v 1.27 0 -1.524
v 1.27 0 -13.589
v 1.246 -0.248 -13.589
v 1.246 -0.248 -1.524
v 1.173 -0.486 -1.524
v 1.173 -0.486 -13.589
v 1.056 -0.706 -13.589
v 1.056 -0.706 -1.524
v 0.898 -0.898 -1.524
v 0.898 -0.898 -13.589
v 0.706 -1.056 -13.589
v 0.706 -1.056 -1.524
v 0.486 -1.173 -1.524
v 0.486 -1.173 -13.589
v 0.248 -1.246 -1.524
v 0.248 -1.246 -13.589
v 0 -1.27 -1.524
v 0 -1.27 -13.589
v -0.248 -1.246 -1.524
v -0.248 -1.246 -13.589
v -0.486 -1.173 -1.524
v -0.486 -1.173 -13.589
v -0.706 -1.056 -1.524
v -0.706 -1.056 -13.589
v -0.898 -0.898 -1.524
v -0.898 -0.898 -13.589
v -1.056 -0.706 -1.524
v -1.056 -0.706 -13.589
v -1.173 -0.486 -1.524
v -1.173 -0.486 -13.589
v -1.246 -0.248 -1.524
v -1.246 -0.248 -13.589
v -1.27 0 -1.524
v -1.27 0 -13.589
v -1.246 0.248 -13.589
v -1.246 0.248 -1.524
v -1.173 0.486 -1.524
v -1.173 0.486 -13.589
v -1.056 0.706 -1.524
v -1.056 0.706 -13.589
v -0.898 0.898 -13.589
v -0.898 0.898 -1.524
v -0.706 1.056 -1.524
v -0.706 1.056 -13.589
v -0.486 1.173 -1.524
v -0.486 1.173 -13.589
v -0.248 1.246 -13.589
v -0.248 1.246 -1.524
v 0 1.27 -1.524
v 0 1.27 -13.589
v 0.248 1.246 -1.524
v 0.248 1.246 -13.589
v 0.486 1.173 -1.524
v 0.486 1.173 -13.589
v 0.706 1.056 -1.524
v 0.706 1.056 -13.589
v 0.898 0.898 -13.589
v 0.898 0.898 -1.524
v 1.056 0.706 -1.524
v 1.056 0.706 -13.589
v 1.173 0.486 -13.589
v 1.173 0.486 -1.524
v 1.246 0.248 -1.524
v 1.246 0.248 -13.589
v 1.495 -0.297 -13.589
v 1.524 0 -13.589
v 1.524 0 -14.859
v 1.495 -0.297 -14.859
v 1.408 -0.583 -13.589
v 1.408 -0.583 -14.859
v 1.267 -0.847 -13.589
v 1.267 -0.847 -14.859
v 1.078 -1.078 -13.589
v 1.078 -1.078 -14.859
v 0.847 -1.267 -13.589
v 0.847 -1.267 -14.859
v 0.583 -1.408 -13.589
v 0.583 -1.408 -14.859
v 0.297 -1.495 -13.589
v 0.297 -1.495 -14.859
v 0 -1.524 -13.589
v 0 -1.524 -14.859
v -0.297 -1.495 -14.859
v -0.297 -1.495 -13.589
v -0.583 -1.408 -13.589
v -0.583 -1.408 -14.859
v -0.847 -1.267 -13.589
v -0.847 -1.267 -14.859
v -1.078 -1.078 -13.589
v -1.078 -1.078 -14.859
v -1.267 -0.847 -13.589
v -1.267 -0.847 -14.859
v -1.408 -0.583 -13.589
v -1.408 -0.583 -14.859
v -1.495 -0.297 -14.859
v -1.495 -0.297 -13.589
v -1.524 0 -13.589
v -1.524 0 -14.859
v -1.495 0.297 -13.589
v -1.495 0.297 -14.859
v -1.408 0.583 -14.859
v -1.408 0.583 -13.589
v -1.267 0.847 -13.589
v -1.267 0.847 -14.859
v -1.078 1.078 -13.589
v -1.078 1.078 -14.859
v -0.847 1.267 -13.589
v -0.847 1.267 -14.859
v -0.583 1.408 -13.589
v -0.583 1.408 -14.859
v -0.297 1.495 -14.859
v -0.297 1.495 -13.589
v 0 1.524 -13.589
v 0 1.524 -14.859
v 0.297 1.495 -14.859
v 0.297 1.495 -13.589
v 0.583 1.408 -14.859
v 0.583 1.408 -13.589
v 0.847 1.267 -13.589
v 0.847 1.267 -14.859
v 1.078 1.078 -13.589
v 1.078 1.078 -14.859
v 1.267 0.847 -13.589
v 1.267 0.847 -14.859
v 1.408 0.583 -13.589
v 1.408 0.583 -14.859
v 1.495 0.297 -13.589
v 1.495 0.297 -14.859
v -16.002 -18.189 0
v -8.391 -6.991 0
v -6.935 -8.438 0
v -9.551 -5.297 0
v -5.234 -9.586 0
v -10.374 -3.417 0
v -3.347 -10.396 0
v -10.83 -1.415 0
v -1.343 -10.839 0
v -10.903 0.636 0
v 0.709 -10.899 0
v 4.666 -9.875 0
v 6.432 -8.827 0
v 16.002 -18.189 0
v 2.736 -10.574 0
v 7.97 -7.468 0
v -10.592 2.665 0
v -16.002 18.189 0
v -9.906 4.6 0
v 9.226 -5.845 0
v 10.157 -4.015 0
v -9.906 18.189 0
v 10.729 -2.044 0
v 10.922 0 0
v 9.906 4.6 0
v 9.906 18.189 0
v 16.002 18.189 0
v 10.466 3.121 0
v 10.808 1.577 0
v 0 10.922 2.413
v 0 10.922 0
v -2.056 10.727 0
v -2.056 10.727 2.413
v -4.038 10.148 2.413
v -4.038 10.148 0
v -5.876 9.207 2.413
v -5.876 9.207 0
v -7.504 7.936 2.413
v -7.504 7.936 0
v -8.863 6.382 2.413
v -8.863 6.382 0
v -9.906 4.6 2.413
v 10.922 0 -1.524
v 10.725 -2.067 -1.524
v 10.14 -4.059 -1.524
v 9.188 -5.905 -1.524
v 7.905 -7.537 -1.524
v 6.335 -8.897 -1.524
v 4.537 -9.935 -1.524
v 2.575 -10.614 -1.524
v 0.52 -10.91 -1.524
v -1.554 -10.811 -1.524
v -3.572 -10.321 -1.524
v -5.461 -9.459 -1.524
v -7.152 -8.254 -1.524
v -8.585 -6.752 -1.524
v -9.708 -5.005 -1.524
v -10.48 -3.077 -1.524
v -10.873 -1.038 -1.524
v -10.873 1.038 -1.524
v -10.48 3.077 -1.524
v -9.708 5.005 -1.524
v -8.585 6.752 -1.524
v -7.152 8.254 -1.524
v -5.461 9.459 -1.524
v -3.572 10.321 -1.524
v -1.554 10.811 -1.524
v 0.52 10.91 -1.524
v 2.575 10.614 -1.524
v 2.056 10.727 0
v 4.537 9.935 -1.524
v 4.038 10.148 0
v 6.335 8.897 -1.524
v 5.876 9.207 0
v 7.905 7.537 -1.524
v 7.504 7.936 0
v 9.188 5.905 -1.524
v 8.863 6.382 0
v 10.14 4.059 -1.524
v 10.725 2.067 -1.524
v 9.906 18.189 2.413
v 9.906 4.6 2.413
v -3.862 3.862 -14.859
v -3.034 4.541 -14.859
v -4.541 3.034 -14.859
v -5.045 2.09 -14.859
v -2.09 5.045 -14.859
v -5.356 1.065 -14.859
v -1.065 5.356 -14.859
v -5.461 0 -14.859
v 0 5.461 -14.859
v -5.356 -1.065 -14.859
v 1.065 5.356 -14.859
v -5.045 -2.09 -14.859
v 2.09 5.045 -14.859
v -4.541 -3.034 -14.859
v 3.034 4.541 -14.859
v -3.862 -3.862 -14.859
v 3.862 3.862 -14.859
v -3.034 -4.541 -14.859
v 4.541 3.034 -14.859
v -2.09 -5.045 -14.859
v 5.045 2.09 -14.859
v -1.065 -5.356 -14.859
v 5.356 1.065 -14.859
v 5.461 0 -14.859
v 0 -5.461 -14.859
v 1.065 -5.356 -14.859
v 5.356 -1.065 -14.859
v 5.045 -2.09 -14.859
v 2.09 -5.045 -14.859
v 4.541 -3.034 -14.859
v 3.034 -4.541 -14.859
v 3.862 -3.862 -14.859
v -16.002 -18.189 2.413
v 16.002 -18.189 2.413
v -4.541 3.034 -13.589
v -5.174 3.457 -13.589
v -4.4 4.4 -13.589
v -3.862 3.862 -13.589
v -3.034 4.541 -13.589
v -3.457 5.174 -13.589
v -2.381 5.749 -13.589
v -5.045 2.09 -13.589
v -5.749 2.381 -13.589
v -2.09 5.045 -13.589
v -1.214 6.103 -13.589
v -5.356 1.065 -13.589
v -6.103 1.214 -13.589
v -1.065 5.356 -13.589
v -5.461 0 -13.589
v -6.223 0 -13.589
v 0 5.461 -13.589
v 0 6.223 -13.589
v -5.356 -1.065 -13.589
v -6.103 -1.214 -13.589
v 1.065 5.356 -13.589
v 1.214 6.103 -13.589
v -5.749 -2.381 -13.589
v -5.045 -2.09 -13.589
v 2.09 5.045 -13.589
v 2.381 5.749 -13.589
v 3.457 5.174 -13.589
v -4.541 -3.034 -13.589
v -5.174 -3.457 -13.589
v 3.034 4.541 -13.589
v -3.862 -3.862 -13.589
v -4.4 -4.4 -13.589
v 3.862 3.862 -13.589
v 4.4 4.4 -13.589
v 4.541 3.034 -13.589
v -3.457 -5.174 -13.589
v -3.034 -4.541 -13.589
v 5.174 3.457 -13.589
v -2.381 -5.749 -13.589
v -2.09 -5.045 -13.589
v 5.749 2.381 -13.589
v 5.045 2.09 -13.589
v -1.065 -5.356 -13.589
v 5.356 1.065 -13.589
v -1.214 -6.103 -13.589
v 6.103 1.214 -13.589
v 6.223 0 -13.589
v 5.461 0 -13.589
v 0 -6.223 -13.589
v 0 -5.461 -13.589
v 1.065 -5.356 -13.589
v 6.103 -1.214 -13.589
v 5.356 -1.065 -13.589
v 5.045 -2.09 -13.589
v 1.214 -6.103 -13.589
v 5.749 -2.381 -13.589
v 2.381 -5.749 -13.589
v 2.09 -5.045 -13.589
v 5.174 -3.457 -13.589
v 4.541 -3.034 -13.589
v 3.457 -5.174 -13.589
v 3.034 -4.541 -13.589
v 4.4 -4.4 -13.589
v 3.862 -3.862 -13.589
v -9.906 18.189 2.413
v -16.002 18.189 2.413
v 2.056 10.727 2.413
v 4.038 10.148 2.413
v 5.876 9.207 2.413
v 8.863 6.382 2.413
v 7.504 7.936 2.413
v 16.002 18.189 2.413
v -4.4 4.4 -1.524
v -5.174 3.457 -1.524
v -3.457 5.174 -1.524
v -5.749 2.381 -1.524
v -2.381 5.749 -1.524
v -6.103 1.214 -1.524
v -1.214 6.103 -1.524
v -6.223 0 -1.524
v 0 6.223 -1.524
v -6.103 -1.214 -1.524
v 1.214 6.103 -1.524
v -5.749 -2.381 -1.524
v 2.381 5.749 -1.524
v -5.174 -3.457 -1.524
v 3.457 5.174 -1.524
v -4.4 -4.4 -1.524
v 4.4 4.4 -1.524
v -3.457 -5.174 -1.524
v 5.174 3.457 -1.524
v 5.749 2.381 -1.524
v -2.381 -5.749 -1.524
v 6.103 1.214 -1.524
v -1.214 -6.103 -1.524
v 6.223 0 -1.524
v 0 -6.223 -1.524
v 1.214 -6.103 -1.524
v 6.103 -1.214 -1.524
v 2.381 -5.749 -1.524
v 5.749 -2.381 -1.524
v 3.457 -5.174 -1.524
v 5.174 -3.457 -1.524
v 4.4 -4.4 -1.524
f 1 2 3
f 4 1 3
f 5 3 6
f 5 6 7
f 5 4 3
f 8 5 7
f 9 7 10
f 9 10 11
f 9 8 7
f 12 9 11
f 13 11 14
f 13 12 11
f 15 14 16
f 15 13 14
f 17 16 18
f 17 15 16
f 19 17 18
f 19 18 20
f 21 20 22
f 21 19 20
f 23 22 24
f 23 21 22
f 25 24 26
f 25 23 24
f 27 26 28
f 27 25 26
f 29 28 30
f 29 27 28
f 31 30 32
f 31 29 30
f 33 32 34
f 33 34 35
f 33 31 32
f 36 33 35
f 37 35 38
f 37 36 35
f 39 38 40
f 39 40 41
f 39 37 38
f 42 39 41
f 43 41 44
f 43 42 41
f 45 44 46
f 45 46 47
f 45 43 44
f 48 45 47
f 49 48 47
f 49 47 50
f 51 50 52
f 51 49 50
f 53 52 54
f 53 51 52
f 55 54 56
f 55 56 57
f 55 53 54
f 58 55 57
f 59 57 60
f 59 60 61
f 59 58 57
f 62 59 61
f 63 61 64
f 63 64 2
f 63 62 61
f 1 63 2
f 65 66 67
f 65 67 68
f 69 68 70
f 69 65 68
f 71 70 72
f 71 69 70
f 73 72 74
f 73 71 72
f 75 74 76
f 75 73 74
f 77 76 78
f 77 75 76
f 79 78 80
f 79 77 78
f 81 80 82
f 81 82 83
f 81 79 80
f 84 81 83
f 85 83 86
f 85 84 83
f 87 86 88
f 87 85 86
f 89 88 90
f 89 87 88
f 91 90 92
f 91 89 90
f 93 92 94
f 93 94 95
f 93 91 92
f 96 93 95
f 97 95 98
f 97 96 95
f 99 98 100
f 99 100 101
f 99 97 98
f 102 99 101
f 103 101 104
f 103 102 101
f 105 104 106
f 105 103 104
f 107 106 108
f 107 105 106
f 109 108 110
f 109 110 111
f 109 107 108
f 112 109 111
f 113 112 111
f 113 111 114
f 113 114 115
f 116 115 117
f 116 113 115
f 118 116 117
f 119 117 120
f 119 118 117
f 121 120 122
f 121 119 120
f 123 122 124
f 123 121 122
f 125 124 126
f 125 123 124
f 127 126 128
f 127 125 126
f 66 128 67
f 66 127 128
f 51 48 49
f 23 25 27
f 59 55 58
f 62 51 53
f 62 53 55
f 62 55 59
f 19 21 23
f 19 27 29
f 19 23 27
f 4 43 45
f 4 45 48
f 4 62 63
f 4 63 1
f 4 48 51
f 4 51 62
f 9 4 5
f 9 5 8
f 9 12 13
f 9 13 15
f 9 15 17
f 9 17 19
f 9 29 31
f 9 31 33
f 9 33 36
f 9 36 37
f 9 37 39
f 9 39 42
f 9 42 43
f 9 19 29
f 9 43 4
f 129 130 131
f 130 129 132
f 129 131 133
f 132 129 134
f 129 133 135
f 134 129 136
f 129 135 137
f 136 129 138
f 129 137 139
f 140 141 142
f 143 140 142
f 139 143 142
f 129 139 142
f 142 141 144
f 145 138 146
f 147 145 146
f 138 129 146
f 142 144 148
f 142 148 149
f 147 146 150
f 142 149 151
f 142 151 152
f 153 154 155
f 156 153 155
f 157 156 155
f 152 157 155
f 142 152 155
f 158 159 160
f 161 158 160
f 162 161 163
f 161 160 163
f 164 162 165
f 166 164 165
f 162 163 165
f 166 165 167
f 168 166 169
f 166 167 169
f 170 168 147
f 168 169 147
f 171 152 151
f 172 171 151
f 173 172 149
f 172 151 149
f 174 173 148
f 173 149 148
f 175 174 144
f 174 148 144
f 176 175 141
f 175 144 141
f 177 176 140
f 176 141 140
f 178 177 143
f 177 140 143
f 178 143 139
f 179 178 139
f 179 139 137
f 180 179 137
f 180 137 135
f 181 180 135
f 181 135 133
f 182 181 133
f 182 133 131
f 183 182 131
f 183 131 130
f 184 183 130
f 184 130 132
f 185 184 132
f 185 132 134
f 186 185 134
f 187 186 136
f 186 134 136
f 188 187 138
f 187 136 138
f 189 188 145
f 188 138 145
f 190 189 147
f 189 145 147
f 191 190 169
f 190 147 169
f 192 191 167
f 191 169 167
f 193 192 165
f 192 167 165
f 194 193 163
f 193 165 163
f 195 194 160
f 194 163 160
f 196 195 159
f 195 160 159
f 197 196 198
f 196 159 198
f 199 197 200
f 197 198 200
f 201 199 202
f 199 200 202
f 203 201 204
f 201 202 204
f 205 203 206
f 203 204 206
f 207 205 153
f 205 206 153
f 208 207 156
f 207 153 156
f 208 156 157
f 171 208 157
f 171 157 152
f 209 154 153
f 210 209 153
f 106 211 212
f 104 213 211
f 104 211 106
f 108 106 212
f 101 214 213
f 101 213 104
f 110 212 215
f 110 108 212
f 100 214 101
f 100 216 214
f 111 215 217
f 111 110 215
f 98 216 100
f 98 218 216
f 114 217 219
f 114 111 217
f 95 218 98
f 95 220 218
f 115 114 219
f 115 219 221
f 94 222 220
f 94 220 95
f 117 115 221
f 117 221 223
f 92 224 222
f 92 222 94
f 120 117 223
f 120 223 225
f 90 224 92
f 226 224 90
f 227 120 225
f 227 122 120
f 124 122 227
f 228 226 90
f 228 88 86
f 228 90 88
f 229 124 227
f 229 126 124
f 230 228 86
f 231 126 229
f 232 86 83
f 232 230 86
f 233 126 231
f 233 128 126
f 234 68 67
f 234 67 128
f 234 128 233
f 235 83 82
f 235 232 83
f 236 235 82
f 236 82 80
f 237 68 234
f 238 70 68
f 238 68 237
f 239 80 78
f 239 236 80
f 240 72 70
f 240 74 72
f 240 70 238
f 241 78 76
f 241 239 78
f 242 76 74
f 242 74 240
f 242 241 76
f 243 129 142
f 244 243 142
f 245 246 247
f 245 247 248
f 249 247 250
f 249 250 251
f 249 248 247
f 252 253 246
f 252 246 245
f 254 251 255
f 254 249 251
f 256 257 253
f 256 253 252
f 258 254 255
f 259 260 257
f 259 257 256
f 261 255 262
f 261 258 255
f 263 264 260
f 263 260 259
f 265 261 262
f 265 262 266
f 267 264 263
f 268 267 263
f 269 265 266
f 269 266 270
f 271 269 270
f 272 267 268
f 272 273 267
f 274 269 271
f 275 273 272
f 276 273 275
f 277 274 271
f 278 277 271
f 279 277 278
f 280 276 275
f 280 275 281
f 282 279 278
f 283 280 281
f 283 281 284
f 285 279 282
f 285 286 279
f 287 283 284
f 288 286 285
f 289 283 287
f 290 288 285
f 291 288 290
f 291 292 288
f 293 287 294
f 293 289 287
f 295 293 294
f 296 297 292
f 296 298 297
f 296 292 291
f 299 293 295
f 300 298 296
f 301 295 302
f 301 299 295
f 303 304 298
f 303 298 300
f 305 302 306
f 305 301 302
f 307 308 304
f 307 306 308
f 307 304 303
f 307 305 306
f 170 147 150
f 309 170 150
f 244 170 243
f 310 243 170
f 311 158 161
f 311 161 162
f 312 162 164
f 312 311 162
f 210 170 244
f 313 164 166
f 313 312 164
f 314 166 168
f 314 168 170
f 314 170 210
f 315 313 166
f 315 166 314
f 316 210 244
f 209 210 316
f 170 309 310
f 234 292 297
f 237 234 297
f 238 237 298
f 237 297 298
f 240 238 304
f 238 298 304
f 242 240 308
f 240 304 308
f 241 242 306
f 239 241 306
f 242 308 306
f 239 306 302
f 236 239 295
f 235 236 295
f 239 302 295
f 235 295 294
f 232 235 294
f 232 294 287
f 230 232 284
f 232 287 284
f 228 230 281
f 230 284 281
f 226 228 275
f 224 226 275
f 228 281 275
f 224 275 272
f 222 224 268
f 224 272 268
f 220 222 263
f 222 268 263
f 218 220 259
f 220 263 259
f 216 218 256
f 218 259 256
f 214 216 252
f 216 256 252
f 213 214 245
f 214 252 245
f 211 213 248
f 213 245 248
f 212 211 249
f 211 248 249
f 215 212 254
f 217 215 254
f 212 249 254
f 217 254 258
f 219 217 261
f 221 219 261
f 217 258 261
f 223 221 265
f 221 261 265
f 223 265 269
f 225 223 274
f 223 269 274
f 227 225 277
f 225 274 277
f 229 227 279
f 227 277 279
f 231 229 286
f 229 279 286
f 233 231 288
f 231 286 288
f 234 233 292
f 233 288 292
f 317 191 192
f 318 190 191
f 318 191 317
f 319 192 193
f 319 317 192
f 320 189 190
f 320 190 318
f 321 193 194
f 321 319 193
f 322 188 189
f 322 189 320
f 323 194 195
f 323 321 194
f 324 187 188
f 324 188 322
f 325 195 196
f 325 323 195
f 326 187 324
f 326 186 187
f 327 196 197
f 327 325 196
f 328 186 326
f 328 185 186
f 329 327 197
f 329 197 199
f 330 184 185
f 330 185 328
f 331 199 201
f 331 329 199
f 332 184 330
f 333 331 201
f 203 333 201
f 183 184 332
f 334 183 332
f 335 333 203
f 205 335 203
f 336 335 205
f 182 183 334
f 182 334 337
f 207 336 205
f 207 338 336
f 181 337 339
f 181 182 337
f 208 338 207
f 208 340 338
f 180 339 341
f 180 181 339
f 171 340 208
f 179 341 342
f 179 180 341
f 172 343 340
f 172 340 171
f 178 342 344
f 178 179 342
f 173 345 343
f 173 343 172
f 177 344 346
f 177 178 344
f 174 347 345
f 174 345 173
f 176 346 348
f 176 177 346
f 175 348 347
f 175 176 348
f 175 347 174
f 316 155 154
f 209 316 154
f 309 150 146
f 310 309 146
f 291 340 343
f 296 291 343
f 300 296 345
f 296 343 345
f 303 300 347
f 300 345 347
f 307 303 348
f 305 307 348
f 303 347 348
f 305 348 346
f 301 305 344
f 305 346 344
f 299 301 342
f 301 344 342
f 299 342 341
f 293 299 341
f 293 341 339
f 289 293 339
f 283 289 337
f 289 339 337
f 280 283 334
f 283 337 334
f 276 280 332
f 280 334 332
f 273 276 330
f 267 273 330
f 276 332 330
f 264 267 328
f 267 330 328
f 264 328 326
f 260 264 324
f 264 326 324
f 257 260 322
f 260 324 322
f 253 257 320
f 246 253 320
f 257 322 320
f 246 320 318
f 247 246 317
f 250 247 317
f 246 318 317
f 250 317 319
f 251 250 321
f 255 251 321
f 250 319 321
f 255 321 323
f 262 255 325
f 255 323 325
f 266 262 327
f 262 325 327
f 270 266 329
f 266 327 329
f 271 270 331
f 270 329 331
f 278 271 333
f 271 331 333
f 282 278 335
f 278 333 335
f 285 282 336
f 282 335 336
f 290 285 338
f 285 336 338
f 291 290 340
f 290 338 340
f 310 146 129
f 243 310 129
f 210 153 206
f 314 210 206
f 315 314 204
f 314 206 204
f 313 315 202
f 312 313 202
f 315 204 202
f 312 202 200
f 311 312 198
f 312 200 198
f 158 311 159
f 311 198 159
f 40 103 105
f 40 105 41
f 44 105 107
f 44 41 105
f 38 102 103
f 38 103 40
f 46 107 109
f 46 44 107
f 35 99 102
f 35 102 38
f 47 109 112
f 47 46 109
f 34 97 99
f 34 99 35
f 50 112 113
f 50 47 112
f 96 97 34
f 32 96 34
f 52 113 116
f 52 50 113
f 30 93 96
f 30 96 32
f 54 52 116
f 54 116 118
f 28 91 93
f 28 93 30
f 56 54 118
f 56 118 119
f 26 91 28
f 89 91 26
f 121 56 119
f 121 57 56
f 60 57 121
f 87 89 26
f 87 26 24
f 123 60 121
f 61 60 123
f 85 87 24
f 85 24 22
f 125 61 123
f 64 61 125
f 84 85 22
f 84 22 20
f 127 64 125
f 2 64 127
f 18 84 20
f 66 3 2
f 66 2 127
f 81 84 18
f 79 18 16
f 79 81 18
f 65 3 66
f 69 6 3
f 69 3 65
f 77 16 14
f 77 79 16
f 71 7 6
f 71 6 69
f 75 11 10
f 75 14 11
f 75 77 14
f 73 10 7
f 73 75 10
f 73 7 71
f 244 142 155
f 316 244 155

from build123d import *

# Parameters (mm, degrees)
F1_DEPTH = 2.413
F2_R     = 10.922
F3_DEPTH = 1.524
F4_R     = 6.223
F4_R_2   = 1.27
F5_DEPTH = 12.065
F6_R     = 5.461
F6_R_2   = 1.524
F7_DEPTH = 1.27


with BuildPart() as f1:
    # F0 (on Top) → F1 (new body)
    with BuildSketch(Plane.XY):
        with BuildLine():
            Line((-16.002, -18.188851), (16.002, -18.188851))
            Line((16.002, -18.188851), (16.002, 18.188851))
            Line((16.002, 18.188851), (9.906, 18.188851))
            Line((9.906, 18.188851), (9.906, 4.600136))
            ThreePointArc((9.906, 4.600136), (5.875687, 9.206866), (0, 10.922))
            ThreePointArc((0, 10.922), (-5.875687, 9.206866), (-9.906, 4.600136))
            Line((-9.906, 4.600136), (-9.906, 18.188851))
            Line((-9.906, 18.188851), (-16.002, 18.188851))
            Line((-16.002, 18.188851), (-16.002, -18.188851))
        make_face()
    extrude(amount=F1_DEPTH)

    # F2 (on face) → F3 (join)
    with BuildSketch(Plane(origin=(0, 0, 0), x_dir=(1, 0, 0), z_dir=(0, 0, -1))):
        Circle(F2_R)
    extrude(amount=F3_DEPTH)

    # F4 (on face) → F5 (join)
    with BuildSketch(Plane(origin=(0, 0, -1.524), x_dir=(1, 0, 0), z_dir=(0, 0, -1))):
        Circle(F4_R)
        Circle(F4_R_2, mode=Mode.SUBTRACT)
    extrude(amount=F5_DEPTH)

    # F6 (on face) → F7 (join)
    with BuildSketch(Plane(origin=(0, 0, -13.589), x_dir=(1, 0, 0), z_dir=(0, 0, -1))):
        Circle(F6_R)
        Circle(F6_R_2, mode=Mode.SUBTRACT)
    extrude(amount=F7_DEPTH)


solid = f1.part
